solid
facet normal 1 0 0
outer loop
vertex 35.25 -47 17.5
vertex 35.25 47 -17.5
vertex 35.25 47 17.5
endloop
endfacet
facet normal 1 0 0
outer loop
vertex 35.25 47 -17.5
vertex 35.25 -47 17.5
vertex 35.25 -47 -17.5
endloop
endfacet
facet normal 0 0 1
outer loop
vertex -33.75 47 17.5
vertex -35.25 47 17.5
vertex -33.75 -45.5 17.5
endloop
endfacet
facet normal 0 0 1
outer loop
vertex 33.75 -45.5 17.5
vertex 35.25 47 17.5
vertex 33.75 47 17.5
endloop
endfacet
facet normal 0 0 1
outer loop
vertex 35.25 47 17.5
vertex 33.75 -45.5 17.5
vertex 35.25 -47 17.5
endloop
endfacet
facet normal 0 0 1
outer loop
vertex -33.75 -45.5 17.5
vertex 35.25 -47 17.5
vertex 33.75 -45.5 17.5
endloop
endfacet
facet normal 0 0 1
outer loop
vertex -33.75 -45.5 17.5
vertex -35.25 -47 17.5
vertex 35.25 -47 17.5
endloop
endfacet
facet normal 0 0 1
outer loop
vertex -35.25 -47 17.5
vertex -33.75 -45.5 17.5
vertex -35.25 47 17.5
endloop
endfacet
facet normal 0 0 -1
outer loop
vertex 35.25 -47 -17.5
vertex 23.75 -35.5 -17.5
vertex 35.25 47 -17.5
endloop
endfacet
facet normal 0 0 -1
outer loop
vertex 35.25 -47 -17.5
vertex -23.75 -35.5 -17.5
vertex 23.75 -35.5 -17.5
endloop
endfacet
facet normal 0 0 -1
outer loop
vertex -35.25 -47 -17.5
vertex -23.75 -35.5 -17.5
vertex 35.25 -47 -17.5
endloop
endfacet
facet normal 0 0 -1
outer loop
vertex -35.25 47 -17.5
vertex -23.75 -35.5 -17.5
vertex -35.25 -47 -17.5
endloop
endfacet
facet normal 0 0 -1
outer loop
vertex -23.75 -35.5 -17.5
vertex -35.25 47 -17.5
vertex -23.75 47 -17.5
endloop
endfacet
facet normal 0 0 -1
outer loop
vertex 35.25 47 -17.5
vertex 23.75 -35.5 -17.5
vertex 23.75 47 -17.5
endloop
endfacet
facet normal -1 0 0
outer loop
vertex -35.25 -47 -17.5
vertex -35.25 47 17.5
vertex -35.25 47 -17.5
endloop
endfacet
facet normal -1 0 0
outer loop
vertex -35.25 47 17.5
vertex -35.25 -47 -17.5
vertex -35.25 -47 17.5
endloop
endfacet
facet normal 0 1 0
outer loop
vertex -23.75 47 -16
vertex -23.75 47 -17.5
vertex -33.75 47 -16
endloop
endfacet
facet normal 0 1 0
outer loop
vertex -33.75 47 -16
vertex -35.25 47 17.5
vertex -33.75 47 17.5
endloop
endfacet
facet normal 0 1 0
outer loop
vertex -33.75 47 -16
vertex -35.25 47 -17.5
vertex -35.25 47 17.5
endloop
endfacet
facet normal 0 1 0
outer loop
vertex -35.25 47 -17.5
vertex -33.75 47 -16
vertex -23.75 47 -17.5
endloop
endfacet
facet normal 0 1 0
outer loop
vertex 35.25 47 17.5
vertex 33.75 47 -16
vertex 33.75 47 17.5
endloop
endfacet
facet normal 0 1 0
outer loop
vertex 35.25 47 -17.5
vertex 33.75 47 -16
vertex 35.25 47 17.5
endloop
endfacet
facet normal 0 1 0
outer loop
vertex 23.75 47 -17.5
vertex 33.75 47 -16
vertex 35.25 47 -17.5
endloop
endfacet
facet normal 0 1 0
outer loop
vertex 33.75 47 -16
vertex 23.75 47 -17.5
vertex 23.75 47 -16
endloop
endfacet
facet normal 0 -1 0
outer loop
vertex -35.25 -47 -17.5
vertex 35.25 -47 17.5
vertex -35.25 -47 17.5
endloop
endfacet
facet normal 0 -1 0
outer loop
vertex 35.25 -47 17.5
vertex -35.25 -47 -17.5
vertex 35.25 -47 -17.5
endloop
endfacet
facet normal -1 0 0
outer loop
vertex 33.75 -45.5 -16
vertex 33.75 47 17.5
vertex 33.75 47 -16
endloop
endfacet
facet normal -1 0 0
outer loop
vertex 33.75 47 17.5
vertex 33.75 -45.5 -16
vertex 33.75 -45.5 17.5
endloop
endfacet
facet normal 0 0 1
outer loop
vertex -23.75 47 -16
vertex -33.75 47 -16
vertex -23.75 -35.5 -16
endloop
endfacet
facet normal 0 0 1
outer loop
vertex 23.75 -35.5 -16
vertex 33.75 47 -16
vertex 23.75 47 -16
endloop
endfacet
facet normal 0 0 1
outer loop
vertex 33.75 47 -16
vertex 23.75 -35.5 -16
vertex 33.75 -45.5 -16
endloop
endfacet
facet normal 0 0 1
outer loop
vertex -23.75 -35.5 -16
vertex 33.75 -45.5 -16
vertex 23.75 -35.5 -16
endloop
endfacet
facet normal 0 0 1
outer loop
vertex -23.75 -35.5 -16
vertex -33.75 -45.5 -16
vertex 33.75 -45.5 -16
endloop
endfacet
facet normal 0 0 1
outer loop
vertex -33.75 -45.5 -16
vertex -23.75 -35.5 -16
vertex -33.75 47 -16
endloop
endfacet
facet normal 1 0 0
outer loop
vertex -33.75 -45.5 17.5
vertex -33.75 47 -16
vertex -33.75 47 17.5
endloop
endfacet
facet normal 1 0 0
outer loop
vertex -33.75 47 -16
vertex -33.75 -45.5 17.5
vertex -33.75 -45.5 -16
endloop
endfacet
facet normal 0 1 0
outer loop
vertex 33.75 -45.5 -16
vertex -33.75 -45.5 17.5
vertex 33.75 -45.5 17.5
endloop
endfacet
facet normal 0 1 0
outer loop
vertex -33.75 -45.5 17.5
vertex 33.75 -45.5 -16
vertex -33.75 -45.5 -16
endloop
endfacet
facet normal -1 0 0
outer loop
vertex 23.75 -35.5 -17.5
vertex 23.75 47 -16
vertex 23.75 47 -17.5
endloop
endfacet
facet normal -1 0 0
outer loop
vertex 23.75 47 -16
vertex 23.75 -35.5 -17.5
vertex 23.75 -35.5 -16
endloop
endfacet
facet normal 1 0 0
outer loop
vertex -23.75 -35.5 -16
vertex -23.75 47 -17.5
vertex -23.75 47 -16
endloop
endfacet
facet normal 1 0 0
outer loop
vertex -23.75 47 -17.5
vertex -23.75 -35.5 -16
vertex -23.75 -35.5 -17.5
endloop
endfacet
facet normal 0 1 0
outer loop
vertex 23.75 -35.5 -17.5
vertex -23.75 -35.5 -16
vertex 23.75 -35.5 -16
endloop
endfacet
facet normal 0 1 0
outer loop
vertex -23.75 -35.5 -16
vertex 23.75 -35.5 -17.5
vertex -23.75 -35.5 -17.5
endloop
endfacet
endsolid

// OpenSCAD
cardSize = [67.5, 91];
boxHeight = 35;
wallThickness = 1.5;
floorThickness = 1.5;
bottomCutInset = 10; 

difference() {
    box = concat([for(size = cardSize) size + wallThickness * 2], [boxHeight]);
    cube(size = box, center = true);

    cutout = [cardSize[0], cardSize[1] + wallThickness * 2, boxHeight];
    translate(v = [0, wallThickness, floorThickness]) 
    cube(size = cutout, center = true);

    bottomCut = [
        cardSize[0] - bottomCutInset * 2,
        cardSize[1],
        floorThickness * 2,
    ];
    translate(v = [0, bottomCutInset, -boxHeight / 2 + floorThickness / 2])
    cube(size = bottomCut, center = true);
}
